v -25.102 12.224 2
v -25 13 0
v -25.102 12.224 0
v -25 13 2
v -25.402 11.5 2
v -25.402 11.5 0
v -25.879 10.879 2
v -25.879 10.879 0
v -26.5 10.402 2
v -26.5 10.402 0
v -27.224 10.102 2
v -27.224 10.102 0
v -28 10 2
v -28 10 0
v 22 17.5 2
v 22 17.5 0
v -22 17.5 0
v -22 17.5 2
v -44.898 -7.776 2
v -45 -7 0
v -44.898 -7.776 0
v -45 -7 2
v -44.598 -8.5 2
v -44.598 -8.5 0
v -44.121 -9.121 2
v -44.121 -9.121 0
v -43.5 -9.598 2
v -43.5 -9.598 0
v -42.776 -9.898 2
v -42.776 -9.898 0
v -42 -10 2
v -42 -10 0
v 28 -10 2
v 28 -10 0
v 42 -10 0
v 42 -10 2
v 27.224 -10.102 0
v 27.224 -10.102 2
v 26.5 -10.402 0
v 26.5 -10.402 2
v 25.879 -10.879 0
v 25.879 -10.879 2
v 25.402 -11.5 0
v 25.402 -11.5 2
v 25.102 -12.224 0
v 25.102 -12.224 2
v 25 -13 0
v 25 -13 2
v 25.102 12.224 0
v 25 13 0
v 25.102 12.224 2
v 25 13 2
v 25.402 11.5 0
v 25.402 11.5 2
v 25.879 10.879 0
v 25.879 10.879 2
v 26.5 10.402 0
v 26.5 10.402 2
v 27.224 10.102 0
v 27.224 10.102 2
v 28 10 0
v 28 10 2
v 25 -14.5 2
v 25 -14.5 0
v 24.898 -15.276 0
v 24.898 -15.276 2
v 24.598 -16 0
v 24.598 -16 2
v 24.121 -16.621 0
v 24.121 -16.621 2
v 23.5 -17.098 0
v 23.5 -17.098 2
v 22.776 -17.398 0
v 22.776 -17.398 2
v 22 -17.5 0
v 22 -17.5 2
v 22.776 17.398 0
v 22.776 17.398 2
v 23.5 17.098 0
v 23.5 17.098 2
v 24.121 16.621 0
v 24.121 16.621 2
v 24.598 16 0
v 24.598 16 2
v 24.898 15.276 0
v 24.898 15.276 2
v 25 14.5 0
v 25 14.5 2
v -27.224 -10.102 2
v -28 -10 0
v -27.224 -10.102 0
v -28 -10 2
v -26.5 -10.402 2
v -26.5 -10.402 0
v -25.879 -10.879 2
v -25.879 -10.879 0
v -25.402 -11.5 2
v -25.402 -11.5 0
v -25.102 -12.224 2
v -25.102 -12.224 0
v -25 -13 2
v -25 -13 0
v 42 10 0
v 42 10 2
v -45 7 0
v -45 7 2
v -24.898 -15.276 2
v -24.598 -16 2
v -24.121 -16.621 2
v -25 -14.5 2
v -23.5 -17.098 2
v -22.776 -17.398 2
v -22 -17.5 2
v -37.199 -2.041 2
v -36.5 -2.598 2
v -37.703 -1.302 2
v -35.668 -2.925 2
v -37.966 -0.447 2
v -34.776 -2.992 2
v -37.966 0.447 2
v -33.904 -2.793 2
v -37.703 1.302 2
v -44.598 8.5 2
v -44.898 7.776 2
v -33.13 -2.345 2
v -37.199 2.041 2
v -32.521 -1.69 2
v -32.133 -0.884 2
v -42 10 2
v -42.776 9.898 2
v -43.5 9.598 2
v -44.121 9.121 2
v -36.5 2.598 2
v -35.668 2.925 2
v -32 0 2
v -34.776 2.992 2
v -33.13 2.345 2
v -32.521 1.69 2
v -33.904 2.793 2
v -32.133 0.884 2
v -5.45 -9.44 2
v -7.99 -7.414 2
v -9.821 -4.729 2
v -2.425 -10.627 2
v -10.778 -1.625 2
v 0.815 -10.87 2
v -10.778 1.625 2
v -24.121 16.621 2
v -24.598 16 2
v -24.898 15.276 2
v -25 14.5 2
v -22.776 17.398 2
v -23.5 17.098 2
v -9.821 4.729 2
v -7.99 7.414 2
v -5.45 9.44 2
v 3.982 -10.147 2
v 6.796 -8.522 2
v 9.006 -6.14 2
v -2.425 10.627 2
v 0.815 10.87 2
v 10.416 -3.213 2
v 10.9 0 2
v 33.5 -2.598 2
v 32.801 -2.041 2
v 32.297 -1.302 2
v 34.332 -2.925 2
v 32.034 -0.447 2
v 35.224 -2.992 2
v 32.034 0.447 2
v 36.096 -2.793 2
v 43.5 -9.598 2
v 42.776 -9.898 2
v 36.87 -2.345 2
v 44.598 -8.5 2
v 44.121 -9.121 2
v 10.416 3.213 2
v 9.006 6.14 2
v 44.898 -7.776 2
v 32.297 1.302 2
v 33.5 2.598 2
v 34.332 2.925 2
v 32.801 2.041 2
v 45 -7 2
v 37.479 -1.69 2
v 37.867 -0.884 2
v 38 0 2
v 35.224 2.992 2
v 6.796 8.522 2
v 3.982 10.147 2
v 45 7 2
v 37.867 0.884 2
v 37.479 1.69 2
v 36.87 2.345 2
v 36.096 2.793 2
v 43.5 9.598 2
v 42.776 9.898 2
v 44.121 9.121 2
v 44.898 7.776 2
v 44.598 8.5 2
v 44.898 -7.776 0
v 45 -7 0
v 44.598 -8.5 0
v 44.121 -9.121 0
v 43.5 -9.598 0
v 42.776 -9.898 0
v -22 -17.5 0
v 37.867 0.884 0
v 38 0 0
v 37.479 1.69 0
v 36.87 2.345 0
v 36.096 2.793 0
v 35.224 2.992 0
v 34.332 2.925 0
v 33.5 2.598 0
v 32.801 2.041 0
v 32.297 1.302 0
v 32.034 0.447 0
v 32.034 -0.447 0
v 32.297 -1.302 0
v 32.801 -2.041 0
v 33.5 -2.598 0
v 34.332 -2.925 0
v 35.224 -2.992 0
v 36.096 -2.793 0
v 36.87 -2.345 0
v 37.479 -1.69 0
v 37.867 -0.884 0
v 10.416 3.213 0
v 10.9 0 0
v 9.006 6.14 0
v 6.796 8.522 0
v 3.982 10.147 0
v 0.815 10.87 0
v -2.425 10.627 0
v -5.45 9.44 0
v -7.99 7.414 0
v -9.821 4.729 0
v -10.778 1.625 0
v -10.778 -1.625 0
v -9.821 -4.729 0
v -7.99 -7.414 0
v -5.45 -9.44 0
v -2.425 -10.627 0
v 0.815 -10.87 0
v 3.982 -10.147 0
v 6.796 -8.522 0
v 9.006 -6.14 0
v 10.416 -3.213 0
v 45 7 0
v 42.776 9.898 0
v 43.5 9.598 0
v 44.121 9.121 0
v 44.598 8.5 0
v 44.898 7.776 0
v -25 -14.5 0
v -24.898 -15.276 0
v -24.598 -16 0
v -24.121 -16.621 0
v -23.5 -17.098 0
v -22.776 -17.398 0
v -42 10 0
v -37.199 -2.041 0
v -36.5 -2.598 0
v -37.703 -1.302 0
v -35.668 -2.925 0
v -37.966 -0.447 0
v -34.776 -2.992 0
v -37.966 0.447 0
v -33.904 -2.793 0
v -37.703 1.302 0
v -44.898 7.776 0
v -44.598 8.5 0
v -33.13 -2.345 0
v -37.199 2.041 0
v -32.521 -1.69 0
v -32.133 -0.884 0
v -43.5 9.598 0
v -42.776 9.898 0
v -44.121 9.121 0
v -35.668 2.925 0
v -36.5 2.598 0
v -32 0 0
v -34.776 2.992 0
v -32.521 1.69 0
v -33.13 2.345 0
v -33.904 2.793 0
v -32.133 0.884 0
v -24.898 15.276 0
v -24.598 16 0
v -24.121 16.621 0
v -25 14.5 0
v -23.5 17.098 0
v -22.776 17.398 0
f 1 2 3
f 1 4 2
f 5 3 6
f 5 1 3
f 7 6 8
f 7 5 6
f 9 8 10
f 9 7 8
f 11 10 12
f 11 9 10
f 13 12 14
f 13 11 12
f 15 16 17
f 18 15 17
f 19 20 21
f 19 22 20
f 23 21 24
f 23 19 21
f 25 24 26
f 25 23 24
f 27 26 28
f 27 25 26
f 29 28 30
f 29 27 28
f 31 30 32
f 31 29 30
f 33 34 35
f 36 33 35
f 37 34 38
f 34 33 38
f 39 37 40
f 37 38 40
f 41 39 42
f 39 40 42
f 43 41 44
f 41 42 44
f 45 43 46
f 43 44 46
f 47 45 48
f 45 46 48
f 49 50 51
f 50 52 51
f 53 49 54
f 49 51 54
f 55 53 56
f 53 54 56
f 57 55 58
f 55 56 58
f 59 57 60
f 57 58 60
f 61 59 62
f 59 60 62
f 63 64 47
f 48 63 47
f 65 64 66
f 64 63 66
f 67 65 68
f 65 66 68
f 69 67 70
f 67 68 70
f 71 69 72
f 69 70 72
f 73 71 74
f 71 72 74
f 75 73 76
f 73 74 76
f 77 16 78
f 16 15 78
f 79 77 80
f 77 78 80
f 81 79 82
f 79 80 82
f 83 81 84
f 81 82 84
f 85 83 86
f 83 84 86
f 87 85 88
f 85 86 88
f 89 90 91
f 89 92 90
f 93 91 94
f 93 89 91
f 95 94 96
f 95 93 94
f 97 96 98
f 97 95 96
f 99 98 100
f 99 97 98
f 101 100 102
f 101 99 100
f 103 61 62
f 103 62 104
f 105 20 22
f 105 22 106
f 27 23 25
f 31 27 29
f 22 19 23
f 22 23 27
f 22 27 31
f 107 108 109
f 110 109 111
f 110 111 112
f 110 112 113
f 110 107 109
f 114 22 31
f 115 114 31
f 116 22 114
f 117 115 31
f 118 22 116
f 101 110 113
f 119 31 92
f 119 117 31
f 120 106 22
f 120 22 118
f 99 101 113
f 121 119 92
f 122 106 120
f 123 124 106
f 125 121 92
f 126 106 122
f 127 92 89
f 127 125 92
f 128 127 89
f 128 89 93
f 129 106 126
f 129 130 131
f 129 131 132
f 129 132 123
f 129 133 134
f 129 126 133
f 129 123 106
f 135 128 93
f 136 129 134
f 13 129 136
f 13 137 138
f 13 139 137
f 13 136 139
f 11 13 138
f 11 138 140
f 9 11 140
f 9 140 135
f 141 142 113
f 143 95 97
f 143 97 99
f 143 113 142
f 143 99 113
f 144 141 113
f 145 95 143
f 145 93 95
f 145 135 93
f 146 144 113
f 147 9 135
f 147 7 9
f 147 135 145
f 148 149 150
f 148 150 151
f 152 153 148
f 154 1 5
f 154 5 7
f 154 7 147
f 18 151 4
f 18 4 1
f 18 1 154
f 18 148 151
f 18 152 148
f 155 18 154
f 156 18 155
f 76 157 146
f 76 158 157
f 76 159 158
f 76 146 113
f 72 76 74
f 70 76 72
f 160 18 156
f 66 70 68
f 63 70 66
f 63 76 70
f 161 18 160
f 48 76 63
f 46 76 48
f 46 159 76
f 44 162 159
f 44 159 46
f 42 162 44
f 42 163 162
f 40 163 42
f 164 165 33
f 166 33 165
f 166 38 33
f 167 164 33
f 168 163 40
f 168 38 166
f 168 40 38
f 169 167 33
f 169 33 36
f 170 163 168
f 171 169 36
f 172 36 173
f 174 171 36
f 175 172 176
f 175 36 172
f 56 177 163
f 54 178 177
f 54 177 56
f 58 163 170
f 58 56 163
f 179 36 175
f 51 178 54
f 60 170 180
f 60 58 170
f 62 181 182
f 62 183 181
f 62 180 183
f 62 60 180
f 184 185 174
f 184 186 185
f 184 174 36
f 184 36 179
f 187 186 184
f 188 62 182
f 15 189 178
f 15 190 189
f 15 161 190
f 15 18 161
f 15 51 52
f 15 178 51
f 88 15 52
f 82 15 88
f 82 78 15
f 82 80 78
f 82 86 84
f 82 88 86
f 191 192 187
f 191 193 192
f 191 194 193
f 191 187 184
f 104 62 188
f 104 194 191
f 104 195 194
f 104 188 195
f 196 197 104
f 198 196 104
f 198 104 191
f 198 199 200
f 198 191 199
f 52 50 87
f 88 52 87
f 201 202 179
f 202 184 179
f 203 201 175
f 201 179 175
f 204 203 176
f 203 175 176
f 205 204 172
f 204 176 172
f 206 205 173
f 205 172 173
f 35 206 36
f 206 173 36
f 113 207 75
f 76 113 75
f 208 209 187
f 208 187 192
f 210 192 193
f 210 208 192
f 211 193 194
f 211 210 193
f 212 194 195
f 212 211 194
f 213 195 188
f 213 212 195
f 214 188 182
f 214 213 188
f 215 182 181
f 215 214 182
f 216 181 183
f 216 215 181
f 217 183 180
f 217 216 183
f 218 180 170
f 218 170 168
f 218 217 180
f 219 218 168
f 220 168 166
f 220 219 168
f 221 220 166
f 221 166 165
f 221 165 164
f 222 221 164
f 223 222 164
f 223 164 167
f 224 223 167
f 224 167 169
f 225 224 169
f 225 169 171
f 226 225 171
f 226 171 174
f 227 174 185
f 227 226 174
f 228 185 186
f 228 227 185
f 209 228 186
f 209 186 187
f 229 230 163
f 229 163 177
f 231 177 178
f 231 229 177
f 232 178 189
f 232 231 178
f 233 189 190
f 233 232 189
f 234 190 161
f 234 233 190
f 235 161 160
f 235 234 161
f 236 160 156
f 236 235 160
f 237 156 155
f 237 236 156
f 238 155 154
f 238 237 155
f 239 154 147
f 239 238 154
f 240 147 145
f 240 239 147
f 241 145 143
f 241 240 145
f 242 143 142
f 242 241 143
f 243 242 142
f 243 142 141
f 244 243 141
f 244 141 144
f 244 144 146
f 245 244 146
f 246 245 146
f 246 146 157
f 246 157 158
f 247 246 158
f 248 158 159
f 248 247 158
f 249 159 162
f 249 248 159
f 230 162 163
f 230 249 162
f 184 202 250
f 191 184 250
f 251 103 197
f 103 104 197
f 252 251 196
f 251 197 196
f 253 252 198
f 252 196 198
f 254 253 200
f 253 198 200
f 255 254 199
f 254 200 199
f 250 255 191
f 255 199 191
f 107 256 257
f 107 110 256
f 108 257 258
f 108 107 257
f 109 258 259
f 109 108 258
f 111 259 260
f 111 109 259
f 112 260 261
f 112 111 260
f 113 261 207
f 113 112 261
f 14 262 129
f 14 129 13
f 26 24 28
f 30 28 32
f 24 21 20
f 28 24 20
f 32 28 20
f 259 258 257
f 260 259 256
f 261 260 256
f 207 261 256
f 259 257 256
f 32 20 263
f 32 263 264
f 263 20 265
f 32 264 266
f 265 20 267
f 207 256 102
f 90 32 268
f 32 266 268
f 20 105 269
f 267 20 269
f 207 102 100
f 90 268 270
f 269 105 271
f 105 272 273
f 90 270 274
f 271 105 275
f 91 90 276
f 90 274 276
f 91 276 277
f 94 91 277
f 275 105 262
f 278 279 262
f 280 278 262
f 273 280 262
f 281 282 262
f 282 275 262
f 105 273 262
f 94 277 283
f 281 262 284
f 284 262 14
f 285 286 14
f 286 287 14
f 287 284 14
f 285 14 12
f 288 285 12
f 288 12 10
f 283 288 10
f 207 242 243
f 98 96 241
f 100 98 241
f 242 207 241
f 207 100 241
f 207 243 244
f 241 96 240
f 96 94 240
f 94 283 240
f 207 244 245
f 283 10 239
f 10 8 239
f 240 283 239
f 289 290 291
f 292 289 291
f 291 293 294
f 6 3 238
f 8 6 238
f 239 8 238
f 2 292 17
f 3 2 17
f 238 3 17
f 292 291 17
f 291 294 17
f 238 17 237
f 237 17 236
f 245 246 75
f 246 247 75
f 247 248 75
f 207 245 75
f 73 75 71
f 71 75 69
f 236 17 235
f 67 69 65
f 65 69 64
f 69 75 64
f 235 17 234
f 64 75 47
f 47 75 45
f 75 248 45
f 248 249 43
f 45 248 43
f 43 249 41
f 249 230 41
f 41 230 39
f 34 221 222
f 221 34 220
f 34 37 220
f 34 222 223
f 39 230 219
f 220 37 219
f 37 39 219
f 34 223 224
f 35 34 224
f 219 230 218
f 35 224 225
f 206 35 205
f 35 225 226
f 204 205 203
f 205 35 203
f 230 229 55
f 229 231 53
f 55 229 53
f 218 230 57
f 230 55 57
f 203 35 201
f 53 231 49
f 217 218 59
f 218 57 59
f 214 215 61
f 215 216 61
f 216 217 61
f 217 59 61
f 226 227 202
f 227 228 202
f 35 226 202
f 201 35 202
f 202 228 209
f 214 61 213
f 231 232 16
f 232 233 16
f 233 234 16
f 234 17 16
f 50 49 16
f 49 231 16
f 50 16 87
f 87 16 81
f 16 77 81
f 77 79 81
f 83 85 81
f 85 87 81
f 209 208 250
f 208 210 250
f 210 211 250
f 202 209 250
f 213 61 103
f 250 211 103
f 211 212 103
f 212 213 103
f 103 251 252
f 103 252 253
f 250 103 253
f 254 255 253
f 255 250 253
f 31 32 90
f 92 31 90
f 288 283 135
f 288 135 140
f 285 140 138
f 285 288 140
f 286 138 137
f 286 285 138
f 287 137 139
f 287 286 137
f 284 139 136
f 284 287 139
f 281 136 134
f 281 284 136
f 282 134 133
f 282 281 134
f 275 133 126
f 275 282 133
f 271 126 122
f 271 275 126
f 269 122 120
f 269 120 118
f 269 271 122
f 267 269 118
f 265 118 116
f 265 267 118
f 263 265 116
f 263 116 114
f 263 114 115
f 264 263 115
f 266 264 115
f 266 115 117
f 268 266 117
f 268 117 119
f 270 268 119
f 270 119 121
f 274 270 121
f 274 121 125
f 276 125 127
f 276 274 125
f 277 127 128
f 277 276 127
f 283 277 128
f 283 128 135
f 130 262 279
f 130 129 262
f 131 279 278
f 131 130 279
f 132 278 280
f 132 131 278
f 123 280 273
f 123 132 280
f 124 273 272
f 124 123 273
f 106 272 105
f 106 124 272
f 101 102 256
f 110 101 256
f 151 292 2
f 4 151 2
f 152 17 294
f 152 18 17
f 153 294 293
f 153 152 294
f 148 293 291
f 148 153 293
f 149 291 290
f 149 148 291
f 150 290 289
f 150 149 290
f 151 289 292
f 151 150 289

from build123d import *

# Parameters (mm, degrees)
F0_R     = 11.5
F0_W     = 20
F0_H     = 20
F0_R_2   = 3
F0_R_3   = 10.9
F1_DEPTH = 2
F2_R     = 3


with BuildPart() as f1:
    # F0 (on Top) → F1 (new body)
    with BuildSketch(Plane.XY):
        Polygon((25, 17.5), (-25, 17.5), (-25, 10), (-25, -10), (-25, -17.5), (25, -17.5), (25, -10), (25, 10), align=None)
        Circle(F0_R, mode=Mode.SUBTRACT)
        with Locations((-35, 0)):
            Rectangle(F0_W, F0_H)
        with Locations((-35, 0)):
            Circle(F0_R_2, mode=Mode.SUBTRACT)
        with Locations((35, 0)):
            Rectangle(F0_W, F0_H)
        with Locations((35, 0)):
            Circle(F0_R_2, mode=Mode.SUBTRACT)
        Circle(F0_R)
        Circle(F0_R_3, mode=Mode.SUBTRACT)
    extrude(amount=F1_DEPTH)

    # F2
    f2_edges = [f1.edges().sort_by_distance(p)[0] for p in [
        (-25, -10, 1),
        (-25, 10, 1),
        (25, 10, 1),
        (25, -10, 1),
        (25, 17.5, 1),
        (25, -17.5, 1),
        (-25, -17.5, 1),
        (-25, 17.5, 1),
        (-45, 10, 1),
        (-45, -10, 1),
        (45, -10, 1),
        (45, 10, 1),
    ]]
    fillet(f2_edges, radius=F2_R)


solid = f1.part
